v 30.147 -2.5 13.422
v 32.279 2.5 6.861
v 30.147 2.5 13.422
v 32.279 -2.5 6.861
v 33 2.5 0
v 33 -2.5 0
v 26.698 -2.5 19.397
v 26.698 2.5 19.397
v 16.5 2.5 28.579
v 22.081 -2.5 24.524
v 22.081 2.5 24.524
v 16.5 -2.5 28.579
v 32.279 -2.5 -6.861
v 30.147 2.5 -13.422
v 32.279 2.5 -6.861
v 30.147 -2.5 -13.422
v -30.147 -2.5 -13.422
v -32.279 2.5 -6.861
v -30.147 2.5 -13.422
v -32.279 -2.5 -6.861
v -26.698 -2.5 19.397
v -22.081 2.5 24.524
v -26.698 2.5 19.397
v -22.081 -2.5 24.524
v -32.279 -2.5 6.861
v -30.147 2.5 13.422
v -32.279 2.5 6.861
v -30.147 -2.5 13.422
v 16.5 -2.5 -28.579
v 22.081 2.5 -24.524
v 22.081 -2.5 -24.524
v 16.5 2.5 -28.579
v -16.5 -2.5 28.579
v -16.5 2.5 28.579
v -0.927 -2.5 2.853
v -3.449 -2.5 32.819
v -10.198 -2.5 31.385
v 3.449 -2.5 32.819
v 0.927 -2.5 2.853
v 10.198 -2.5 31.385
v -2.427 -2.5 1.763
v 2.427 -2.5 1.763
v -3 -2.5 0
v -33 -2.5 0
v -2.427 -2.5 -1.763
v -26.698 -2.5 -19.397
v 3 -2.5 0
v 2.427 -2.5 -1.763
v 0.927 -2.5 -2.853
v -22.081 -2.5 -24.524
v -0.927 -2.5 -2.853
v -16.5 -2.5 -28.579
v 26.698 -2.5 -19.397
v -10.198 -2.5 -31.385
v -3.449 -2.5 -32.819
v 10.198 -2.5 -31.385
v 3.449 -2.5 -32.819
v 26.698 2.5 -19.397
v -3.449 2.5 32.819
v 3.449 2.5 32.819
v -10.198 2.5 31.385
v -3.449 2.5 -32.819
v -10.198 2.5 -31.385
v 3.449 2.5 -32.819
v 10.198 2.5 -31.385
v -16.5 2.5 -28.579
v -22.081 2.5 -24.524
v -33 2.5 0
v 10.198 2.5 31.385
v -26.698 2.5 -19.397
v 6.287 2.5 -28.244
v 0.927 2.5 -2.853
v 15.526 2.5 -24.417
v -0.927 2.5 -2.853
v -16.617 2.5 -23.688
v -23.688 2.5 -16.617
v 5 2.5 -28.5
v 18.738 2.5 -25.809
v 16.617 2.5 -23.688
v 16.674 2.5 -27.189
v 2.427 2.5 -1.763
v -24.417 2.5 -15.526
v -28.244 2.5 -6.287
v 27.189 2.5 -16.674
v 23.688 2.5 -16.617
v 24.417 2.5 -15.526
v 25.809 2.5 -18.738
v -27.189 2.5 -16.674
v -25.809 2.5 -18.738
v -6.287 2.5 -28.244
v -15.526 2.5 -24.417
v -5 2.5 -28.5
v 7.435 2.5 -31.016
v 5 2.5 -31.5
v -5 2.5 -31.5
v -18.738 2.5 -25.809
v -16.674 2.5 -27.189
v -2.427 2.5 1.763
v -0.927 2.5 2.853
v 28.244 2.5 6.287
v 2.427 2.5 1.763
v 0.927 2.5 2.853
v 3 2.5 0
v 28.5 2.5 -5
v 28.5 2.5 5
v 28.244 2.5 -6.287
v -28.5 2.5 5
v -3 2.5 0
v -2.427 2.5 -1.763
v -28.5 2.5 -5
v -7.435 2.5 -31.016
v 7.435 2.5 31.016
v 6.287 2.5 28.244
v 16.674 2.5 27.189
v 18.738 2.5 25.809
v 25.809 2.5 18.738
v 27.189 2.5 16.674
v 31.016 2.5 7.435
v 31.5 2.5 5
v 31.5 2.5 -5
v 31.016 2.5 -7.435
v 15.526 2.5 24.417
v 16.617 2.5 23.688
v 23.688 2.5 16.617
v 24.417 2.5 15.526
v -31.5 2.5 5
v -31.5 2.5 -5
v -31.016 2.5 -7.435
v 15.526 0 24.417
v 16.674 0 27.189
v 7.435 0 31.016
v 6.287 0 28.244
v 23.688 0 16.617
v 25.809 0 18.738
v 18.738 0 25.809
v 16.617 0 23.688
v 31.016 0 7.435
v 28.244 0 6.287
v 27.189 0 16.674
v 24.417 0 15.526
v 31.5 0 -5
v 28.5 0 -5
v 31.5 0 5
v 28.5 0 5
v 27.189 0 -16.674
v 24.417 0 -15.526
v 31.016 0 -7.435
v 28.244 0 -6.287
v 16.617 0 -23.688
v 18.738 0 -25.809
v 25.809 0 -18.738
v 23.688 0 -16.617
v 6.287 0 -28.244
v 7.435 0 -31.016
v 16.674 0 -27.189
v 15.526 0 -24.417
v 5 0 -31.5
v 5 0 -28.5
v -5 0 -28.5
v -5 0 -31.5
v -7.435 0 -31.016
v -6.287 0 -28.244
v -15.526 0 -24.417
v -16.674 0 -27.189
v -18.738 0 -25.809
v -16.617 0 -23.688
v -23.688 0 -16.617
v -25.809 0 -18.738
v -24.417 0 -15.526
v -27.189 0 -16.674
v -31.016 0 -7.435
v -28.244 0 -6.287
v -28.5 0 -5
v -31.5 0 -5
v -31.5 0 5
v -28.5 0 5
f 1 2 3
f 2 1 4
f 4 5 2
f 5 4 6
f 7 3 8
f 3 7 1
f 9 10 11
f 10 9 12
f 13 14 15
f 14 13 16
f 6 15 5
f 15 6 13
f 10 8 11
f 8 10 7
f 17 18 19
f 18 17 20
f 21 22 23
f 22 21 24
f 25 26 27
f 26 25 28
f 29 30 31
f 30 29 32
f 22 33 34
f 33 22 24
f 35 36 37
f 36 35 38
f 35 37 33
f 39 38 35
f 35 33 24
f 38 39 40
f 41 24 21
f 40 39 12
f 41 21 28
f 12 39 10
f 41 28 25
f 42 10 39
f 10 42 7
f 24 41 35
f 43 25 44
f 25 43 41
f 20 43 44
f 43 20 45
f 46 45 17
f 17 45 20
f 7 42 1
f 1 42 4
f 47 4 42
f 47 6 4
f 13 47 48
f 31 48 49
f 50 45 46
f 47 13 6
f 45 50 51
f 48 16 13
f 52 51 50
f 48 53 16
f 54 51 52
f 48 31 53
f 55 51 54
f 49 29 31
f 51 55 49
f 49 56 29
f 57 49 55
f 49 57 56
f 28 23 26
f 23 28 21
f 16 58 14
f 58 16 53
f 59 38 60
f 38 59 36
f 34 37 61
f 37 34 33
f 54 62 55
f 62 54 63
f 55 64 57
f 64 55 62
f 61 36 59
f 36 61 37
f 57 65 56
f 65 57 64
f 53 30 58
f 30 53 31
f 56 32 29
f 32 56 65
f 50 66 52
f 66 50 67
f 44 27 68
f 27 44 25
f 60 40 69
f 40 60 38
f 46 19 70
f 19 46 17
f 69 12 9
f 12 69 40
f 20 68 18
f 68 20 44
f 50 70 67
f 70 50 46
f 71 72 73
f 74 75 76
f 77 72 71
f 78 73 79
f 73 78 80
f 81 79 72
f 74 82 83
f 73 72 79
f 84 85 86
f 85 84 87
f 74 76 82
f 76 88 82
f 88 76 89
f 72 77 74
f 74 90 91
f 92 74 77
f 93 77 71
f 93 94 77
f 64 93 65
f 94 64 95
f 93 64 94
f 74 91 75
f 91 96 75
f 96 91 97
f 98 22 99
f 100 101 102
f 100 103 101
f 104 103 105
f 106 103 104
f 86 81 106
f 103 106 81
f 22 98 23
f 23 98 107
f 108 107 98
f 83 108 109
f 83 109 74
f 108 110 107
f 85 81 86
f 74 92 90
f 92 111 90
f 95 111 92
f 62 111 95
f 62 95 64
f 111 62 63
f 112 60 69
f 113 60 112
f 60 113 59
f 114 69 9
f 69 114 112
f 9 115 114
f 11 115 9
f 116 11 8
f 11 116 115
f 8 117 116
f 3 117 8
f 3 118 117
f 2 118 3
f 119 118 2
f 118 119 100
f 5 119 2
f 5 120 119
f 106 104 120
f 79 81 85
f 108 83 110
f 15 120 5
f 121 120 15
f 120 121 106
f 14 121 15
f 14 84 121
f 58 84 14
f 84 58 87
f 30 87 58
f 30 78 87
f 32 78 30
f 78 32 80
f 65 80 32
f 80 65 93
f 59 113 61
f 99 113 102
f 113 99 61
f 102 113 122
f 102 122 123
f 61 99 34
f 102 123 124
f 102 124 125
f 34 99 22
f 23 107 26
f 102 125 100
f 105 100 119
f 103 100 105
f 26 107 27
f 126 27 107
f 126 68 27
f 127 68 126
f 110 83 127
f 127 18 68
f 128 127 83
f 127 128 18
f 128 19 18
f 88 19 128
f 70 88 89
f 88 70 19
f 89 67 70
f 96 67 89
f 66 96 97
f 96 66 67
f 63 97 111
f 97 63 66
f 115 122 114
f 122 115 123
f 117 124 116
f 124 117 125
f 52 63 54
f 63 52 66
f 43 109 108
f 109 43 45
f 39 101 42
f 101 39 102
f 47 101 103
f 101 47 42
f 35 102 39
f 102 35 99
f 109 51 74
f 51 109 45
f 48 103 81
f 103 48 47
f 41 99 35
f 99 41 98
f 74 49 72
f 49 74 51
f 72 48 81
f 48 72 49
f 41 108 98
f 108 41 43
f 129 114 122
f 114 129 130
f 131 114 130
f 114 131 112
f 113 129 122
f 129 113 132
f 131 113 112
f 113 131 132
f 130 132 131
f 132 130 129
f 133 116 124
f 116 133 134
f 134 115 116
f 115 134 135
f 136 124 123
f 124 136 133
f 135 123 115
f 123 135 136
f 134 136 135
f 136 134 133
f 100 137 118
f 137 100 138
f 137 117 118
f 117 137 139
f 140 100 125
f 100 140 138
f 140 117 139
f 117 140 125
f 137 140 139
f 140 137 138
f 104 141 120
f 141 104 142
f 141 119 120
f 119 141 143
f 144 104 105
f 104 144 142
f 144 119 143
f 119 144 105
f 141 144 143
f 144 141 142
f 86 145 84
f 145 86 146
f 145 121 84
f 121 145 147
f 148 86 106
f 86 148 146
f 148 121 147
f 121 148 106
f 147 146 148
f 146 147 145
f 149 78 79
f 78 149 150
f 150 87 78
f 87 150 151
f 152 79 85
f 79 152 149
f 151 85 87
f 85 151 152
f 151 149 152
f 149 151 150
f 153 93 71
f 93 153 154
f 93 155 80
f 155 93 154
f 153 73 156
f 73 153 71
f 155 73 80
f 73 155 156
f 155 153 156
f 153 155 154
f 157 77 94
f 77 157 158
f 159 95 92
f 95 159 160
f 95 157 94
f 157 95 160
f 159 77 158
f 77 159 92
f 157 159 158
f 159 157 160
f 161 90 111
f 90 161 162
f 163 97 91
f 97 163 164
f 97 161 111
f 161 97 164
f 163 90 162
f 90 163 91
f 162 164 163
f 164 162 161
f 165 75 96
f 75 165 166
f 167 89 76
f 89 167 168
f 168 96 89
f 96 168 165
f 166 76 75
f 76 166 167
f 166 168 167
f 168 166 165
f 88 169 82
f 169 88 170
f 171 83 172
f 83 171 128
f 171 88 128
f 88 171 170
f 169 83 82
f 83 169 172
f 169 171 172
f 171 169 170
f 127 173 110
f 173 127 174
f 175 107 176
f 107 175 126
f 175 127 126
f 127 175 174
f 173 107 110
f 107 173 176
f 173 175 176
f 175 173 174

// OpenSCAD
// Rotary encoder
board_thickness = 3;
board_height = 10;
board_width = 80;
display_radius = 30;
end_cap_overlap = 3;
end_cap_thickness = 5;
shaft_radius = 3;

module board() {
    translate([-board_height/2,0,-board_thickness/2]) cube([board_height, board_width, board_thickness]);
}


module board_ring() {
  // Create all the boards
  for (i = [270/12 : 270/12 : 270]) {
    rotate(i, [0,1,0]) translate([0, 0, display_radius]) board();
  }
}

difference() {
  rotate([90,0,0]) translate([0,0,-end_cap_thickness/2]) difference() {
      cylinder(r=display_radius+end_cap_overlap, h=end_cap_thickness);
      translate([0,0,-end_cap_thickness/2]) cylinder(r=shaft_radius, h=end_cap_thickness*2);
  }
  #board_ring();
}
